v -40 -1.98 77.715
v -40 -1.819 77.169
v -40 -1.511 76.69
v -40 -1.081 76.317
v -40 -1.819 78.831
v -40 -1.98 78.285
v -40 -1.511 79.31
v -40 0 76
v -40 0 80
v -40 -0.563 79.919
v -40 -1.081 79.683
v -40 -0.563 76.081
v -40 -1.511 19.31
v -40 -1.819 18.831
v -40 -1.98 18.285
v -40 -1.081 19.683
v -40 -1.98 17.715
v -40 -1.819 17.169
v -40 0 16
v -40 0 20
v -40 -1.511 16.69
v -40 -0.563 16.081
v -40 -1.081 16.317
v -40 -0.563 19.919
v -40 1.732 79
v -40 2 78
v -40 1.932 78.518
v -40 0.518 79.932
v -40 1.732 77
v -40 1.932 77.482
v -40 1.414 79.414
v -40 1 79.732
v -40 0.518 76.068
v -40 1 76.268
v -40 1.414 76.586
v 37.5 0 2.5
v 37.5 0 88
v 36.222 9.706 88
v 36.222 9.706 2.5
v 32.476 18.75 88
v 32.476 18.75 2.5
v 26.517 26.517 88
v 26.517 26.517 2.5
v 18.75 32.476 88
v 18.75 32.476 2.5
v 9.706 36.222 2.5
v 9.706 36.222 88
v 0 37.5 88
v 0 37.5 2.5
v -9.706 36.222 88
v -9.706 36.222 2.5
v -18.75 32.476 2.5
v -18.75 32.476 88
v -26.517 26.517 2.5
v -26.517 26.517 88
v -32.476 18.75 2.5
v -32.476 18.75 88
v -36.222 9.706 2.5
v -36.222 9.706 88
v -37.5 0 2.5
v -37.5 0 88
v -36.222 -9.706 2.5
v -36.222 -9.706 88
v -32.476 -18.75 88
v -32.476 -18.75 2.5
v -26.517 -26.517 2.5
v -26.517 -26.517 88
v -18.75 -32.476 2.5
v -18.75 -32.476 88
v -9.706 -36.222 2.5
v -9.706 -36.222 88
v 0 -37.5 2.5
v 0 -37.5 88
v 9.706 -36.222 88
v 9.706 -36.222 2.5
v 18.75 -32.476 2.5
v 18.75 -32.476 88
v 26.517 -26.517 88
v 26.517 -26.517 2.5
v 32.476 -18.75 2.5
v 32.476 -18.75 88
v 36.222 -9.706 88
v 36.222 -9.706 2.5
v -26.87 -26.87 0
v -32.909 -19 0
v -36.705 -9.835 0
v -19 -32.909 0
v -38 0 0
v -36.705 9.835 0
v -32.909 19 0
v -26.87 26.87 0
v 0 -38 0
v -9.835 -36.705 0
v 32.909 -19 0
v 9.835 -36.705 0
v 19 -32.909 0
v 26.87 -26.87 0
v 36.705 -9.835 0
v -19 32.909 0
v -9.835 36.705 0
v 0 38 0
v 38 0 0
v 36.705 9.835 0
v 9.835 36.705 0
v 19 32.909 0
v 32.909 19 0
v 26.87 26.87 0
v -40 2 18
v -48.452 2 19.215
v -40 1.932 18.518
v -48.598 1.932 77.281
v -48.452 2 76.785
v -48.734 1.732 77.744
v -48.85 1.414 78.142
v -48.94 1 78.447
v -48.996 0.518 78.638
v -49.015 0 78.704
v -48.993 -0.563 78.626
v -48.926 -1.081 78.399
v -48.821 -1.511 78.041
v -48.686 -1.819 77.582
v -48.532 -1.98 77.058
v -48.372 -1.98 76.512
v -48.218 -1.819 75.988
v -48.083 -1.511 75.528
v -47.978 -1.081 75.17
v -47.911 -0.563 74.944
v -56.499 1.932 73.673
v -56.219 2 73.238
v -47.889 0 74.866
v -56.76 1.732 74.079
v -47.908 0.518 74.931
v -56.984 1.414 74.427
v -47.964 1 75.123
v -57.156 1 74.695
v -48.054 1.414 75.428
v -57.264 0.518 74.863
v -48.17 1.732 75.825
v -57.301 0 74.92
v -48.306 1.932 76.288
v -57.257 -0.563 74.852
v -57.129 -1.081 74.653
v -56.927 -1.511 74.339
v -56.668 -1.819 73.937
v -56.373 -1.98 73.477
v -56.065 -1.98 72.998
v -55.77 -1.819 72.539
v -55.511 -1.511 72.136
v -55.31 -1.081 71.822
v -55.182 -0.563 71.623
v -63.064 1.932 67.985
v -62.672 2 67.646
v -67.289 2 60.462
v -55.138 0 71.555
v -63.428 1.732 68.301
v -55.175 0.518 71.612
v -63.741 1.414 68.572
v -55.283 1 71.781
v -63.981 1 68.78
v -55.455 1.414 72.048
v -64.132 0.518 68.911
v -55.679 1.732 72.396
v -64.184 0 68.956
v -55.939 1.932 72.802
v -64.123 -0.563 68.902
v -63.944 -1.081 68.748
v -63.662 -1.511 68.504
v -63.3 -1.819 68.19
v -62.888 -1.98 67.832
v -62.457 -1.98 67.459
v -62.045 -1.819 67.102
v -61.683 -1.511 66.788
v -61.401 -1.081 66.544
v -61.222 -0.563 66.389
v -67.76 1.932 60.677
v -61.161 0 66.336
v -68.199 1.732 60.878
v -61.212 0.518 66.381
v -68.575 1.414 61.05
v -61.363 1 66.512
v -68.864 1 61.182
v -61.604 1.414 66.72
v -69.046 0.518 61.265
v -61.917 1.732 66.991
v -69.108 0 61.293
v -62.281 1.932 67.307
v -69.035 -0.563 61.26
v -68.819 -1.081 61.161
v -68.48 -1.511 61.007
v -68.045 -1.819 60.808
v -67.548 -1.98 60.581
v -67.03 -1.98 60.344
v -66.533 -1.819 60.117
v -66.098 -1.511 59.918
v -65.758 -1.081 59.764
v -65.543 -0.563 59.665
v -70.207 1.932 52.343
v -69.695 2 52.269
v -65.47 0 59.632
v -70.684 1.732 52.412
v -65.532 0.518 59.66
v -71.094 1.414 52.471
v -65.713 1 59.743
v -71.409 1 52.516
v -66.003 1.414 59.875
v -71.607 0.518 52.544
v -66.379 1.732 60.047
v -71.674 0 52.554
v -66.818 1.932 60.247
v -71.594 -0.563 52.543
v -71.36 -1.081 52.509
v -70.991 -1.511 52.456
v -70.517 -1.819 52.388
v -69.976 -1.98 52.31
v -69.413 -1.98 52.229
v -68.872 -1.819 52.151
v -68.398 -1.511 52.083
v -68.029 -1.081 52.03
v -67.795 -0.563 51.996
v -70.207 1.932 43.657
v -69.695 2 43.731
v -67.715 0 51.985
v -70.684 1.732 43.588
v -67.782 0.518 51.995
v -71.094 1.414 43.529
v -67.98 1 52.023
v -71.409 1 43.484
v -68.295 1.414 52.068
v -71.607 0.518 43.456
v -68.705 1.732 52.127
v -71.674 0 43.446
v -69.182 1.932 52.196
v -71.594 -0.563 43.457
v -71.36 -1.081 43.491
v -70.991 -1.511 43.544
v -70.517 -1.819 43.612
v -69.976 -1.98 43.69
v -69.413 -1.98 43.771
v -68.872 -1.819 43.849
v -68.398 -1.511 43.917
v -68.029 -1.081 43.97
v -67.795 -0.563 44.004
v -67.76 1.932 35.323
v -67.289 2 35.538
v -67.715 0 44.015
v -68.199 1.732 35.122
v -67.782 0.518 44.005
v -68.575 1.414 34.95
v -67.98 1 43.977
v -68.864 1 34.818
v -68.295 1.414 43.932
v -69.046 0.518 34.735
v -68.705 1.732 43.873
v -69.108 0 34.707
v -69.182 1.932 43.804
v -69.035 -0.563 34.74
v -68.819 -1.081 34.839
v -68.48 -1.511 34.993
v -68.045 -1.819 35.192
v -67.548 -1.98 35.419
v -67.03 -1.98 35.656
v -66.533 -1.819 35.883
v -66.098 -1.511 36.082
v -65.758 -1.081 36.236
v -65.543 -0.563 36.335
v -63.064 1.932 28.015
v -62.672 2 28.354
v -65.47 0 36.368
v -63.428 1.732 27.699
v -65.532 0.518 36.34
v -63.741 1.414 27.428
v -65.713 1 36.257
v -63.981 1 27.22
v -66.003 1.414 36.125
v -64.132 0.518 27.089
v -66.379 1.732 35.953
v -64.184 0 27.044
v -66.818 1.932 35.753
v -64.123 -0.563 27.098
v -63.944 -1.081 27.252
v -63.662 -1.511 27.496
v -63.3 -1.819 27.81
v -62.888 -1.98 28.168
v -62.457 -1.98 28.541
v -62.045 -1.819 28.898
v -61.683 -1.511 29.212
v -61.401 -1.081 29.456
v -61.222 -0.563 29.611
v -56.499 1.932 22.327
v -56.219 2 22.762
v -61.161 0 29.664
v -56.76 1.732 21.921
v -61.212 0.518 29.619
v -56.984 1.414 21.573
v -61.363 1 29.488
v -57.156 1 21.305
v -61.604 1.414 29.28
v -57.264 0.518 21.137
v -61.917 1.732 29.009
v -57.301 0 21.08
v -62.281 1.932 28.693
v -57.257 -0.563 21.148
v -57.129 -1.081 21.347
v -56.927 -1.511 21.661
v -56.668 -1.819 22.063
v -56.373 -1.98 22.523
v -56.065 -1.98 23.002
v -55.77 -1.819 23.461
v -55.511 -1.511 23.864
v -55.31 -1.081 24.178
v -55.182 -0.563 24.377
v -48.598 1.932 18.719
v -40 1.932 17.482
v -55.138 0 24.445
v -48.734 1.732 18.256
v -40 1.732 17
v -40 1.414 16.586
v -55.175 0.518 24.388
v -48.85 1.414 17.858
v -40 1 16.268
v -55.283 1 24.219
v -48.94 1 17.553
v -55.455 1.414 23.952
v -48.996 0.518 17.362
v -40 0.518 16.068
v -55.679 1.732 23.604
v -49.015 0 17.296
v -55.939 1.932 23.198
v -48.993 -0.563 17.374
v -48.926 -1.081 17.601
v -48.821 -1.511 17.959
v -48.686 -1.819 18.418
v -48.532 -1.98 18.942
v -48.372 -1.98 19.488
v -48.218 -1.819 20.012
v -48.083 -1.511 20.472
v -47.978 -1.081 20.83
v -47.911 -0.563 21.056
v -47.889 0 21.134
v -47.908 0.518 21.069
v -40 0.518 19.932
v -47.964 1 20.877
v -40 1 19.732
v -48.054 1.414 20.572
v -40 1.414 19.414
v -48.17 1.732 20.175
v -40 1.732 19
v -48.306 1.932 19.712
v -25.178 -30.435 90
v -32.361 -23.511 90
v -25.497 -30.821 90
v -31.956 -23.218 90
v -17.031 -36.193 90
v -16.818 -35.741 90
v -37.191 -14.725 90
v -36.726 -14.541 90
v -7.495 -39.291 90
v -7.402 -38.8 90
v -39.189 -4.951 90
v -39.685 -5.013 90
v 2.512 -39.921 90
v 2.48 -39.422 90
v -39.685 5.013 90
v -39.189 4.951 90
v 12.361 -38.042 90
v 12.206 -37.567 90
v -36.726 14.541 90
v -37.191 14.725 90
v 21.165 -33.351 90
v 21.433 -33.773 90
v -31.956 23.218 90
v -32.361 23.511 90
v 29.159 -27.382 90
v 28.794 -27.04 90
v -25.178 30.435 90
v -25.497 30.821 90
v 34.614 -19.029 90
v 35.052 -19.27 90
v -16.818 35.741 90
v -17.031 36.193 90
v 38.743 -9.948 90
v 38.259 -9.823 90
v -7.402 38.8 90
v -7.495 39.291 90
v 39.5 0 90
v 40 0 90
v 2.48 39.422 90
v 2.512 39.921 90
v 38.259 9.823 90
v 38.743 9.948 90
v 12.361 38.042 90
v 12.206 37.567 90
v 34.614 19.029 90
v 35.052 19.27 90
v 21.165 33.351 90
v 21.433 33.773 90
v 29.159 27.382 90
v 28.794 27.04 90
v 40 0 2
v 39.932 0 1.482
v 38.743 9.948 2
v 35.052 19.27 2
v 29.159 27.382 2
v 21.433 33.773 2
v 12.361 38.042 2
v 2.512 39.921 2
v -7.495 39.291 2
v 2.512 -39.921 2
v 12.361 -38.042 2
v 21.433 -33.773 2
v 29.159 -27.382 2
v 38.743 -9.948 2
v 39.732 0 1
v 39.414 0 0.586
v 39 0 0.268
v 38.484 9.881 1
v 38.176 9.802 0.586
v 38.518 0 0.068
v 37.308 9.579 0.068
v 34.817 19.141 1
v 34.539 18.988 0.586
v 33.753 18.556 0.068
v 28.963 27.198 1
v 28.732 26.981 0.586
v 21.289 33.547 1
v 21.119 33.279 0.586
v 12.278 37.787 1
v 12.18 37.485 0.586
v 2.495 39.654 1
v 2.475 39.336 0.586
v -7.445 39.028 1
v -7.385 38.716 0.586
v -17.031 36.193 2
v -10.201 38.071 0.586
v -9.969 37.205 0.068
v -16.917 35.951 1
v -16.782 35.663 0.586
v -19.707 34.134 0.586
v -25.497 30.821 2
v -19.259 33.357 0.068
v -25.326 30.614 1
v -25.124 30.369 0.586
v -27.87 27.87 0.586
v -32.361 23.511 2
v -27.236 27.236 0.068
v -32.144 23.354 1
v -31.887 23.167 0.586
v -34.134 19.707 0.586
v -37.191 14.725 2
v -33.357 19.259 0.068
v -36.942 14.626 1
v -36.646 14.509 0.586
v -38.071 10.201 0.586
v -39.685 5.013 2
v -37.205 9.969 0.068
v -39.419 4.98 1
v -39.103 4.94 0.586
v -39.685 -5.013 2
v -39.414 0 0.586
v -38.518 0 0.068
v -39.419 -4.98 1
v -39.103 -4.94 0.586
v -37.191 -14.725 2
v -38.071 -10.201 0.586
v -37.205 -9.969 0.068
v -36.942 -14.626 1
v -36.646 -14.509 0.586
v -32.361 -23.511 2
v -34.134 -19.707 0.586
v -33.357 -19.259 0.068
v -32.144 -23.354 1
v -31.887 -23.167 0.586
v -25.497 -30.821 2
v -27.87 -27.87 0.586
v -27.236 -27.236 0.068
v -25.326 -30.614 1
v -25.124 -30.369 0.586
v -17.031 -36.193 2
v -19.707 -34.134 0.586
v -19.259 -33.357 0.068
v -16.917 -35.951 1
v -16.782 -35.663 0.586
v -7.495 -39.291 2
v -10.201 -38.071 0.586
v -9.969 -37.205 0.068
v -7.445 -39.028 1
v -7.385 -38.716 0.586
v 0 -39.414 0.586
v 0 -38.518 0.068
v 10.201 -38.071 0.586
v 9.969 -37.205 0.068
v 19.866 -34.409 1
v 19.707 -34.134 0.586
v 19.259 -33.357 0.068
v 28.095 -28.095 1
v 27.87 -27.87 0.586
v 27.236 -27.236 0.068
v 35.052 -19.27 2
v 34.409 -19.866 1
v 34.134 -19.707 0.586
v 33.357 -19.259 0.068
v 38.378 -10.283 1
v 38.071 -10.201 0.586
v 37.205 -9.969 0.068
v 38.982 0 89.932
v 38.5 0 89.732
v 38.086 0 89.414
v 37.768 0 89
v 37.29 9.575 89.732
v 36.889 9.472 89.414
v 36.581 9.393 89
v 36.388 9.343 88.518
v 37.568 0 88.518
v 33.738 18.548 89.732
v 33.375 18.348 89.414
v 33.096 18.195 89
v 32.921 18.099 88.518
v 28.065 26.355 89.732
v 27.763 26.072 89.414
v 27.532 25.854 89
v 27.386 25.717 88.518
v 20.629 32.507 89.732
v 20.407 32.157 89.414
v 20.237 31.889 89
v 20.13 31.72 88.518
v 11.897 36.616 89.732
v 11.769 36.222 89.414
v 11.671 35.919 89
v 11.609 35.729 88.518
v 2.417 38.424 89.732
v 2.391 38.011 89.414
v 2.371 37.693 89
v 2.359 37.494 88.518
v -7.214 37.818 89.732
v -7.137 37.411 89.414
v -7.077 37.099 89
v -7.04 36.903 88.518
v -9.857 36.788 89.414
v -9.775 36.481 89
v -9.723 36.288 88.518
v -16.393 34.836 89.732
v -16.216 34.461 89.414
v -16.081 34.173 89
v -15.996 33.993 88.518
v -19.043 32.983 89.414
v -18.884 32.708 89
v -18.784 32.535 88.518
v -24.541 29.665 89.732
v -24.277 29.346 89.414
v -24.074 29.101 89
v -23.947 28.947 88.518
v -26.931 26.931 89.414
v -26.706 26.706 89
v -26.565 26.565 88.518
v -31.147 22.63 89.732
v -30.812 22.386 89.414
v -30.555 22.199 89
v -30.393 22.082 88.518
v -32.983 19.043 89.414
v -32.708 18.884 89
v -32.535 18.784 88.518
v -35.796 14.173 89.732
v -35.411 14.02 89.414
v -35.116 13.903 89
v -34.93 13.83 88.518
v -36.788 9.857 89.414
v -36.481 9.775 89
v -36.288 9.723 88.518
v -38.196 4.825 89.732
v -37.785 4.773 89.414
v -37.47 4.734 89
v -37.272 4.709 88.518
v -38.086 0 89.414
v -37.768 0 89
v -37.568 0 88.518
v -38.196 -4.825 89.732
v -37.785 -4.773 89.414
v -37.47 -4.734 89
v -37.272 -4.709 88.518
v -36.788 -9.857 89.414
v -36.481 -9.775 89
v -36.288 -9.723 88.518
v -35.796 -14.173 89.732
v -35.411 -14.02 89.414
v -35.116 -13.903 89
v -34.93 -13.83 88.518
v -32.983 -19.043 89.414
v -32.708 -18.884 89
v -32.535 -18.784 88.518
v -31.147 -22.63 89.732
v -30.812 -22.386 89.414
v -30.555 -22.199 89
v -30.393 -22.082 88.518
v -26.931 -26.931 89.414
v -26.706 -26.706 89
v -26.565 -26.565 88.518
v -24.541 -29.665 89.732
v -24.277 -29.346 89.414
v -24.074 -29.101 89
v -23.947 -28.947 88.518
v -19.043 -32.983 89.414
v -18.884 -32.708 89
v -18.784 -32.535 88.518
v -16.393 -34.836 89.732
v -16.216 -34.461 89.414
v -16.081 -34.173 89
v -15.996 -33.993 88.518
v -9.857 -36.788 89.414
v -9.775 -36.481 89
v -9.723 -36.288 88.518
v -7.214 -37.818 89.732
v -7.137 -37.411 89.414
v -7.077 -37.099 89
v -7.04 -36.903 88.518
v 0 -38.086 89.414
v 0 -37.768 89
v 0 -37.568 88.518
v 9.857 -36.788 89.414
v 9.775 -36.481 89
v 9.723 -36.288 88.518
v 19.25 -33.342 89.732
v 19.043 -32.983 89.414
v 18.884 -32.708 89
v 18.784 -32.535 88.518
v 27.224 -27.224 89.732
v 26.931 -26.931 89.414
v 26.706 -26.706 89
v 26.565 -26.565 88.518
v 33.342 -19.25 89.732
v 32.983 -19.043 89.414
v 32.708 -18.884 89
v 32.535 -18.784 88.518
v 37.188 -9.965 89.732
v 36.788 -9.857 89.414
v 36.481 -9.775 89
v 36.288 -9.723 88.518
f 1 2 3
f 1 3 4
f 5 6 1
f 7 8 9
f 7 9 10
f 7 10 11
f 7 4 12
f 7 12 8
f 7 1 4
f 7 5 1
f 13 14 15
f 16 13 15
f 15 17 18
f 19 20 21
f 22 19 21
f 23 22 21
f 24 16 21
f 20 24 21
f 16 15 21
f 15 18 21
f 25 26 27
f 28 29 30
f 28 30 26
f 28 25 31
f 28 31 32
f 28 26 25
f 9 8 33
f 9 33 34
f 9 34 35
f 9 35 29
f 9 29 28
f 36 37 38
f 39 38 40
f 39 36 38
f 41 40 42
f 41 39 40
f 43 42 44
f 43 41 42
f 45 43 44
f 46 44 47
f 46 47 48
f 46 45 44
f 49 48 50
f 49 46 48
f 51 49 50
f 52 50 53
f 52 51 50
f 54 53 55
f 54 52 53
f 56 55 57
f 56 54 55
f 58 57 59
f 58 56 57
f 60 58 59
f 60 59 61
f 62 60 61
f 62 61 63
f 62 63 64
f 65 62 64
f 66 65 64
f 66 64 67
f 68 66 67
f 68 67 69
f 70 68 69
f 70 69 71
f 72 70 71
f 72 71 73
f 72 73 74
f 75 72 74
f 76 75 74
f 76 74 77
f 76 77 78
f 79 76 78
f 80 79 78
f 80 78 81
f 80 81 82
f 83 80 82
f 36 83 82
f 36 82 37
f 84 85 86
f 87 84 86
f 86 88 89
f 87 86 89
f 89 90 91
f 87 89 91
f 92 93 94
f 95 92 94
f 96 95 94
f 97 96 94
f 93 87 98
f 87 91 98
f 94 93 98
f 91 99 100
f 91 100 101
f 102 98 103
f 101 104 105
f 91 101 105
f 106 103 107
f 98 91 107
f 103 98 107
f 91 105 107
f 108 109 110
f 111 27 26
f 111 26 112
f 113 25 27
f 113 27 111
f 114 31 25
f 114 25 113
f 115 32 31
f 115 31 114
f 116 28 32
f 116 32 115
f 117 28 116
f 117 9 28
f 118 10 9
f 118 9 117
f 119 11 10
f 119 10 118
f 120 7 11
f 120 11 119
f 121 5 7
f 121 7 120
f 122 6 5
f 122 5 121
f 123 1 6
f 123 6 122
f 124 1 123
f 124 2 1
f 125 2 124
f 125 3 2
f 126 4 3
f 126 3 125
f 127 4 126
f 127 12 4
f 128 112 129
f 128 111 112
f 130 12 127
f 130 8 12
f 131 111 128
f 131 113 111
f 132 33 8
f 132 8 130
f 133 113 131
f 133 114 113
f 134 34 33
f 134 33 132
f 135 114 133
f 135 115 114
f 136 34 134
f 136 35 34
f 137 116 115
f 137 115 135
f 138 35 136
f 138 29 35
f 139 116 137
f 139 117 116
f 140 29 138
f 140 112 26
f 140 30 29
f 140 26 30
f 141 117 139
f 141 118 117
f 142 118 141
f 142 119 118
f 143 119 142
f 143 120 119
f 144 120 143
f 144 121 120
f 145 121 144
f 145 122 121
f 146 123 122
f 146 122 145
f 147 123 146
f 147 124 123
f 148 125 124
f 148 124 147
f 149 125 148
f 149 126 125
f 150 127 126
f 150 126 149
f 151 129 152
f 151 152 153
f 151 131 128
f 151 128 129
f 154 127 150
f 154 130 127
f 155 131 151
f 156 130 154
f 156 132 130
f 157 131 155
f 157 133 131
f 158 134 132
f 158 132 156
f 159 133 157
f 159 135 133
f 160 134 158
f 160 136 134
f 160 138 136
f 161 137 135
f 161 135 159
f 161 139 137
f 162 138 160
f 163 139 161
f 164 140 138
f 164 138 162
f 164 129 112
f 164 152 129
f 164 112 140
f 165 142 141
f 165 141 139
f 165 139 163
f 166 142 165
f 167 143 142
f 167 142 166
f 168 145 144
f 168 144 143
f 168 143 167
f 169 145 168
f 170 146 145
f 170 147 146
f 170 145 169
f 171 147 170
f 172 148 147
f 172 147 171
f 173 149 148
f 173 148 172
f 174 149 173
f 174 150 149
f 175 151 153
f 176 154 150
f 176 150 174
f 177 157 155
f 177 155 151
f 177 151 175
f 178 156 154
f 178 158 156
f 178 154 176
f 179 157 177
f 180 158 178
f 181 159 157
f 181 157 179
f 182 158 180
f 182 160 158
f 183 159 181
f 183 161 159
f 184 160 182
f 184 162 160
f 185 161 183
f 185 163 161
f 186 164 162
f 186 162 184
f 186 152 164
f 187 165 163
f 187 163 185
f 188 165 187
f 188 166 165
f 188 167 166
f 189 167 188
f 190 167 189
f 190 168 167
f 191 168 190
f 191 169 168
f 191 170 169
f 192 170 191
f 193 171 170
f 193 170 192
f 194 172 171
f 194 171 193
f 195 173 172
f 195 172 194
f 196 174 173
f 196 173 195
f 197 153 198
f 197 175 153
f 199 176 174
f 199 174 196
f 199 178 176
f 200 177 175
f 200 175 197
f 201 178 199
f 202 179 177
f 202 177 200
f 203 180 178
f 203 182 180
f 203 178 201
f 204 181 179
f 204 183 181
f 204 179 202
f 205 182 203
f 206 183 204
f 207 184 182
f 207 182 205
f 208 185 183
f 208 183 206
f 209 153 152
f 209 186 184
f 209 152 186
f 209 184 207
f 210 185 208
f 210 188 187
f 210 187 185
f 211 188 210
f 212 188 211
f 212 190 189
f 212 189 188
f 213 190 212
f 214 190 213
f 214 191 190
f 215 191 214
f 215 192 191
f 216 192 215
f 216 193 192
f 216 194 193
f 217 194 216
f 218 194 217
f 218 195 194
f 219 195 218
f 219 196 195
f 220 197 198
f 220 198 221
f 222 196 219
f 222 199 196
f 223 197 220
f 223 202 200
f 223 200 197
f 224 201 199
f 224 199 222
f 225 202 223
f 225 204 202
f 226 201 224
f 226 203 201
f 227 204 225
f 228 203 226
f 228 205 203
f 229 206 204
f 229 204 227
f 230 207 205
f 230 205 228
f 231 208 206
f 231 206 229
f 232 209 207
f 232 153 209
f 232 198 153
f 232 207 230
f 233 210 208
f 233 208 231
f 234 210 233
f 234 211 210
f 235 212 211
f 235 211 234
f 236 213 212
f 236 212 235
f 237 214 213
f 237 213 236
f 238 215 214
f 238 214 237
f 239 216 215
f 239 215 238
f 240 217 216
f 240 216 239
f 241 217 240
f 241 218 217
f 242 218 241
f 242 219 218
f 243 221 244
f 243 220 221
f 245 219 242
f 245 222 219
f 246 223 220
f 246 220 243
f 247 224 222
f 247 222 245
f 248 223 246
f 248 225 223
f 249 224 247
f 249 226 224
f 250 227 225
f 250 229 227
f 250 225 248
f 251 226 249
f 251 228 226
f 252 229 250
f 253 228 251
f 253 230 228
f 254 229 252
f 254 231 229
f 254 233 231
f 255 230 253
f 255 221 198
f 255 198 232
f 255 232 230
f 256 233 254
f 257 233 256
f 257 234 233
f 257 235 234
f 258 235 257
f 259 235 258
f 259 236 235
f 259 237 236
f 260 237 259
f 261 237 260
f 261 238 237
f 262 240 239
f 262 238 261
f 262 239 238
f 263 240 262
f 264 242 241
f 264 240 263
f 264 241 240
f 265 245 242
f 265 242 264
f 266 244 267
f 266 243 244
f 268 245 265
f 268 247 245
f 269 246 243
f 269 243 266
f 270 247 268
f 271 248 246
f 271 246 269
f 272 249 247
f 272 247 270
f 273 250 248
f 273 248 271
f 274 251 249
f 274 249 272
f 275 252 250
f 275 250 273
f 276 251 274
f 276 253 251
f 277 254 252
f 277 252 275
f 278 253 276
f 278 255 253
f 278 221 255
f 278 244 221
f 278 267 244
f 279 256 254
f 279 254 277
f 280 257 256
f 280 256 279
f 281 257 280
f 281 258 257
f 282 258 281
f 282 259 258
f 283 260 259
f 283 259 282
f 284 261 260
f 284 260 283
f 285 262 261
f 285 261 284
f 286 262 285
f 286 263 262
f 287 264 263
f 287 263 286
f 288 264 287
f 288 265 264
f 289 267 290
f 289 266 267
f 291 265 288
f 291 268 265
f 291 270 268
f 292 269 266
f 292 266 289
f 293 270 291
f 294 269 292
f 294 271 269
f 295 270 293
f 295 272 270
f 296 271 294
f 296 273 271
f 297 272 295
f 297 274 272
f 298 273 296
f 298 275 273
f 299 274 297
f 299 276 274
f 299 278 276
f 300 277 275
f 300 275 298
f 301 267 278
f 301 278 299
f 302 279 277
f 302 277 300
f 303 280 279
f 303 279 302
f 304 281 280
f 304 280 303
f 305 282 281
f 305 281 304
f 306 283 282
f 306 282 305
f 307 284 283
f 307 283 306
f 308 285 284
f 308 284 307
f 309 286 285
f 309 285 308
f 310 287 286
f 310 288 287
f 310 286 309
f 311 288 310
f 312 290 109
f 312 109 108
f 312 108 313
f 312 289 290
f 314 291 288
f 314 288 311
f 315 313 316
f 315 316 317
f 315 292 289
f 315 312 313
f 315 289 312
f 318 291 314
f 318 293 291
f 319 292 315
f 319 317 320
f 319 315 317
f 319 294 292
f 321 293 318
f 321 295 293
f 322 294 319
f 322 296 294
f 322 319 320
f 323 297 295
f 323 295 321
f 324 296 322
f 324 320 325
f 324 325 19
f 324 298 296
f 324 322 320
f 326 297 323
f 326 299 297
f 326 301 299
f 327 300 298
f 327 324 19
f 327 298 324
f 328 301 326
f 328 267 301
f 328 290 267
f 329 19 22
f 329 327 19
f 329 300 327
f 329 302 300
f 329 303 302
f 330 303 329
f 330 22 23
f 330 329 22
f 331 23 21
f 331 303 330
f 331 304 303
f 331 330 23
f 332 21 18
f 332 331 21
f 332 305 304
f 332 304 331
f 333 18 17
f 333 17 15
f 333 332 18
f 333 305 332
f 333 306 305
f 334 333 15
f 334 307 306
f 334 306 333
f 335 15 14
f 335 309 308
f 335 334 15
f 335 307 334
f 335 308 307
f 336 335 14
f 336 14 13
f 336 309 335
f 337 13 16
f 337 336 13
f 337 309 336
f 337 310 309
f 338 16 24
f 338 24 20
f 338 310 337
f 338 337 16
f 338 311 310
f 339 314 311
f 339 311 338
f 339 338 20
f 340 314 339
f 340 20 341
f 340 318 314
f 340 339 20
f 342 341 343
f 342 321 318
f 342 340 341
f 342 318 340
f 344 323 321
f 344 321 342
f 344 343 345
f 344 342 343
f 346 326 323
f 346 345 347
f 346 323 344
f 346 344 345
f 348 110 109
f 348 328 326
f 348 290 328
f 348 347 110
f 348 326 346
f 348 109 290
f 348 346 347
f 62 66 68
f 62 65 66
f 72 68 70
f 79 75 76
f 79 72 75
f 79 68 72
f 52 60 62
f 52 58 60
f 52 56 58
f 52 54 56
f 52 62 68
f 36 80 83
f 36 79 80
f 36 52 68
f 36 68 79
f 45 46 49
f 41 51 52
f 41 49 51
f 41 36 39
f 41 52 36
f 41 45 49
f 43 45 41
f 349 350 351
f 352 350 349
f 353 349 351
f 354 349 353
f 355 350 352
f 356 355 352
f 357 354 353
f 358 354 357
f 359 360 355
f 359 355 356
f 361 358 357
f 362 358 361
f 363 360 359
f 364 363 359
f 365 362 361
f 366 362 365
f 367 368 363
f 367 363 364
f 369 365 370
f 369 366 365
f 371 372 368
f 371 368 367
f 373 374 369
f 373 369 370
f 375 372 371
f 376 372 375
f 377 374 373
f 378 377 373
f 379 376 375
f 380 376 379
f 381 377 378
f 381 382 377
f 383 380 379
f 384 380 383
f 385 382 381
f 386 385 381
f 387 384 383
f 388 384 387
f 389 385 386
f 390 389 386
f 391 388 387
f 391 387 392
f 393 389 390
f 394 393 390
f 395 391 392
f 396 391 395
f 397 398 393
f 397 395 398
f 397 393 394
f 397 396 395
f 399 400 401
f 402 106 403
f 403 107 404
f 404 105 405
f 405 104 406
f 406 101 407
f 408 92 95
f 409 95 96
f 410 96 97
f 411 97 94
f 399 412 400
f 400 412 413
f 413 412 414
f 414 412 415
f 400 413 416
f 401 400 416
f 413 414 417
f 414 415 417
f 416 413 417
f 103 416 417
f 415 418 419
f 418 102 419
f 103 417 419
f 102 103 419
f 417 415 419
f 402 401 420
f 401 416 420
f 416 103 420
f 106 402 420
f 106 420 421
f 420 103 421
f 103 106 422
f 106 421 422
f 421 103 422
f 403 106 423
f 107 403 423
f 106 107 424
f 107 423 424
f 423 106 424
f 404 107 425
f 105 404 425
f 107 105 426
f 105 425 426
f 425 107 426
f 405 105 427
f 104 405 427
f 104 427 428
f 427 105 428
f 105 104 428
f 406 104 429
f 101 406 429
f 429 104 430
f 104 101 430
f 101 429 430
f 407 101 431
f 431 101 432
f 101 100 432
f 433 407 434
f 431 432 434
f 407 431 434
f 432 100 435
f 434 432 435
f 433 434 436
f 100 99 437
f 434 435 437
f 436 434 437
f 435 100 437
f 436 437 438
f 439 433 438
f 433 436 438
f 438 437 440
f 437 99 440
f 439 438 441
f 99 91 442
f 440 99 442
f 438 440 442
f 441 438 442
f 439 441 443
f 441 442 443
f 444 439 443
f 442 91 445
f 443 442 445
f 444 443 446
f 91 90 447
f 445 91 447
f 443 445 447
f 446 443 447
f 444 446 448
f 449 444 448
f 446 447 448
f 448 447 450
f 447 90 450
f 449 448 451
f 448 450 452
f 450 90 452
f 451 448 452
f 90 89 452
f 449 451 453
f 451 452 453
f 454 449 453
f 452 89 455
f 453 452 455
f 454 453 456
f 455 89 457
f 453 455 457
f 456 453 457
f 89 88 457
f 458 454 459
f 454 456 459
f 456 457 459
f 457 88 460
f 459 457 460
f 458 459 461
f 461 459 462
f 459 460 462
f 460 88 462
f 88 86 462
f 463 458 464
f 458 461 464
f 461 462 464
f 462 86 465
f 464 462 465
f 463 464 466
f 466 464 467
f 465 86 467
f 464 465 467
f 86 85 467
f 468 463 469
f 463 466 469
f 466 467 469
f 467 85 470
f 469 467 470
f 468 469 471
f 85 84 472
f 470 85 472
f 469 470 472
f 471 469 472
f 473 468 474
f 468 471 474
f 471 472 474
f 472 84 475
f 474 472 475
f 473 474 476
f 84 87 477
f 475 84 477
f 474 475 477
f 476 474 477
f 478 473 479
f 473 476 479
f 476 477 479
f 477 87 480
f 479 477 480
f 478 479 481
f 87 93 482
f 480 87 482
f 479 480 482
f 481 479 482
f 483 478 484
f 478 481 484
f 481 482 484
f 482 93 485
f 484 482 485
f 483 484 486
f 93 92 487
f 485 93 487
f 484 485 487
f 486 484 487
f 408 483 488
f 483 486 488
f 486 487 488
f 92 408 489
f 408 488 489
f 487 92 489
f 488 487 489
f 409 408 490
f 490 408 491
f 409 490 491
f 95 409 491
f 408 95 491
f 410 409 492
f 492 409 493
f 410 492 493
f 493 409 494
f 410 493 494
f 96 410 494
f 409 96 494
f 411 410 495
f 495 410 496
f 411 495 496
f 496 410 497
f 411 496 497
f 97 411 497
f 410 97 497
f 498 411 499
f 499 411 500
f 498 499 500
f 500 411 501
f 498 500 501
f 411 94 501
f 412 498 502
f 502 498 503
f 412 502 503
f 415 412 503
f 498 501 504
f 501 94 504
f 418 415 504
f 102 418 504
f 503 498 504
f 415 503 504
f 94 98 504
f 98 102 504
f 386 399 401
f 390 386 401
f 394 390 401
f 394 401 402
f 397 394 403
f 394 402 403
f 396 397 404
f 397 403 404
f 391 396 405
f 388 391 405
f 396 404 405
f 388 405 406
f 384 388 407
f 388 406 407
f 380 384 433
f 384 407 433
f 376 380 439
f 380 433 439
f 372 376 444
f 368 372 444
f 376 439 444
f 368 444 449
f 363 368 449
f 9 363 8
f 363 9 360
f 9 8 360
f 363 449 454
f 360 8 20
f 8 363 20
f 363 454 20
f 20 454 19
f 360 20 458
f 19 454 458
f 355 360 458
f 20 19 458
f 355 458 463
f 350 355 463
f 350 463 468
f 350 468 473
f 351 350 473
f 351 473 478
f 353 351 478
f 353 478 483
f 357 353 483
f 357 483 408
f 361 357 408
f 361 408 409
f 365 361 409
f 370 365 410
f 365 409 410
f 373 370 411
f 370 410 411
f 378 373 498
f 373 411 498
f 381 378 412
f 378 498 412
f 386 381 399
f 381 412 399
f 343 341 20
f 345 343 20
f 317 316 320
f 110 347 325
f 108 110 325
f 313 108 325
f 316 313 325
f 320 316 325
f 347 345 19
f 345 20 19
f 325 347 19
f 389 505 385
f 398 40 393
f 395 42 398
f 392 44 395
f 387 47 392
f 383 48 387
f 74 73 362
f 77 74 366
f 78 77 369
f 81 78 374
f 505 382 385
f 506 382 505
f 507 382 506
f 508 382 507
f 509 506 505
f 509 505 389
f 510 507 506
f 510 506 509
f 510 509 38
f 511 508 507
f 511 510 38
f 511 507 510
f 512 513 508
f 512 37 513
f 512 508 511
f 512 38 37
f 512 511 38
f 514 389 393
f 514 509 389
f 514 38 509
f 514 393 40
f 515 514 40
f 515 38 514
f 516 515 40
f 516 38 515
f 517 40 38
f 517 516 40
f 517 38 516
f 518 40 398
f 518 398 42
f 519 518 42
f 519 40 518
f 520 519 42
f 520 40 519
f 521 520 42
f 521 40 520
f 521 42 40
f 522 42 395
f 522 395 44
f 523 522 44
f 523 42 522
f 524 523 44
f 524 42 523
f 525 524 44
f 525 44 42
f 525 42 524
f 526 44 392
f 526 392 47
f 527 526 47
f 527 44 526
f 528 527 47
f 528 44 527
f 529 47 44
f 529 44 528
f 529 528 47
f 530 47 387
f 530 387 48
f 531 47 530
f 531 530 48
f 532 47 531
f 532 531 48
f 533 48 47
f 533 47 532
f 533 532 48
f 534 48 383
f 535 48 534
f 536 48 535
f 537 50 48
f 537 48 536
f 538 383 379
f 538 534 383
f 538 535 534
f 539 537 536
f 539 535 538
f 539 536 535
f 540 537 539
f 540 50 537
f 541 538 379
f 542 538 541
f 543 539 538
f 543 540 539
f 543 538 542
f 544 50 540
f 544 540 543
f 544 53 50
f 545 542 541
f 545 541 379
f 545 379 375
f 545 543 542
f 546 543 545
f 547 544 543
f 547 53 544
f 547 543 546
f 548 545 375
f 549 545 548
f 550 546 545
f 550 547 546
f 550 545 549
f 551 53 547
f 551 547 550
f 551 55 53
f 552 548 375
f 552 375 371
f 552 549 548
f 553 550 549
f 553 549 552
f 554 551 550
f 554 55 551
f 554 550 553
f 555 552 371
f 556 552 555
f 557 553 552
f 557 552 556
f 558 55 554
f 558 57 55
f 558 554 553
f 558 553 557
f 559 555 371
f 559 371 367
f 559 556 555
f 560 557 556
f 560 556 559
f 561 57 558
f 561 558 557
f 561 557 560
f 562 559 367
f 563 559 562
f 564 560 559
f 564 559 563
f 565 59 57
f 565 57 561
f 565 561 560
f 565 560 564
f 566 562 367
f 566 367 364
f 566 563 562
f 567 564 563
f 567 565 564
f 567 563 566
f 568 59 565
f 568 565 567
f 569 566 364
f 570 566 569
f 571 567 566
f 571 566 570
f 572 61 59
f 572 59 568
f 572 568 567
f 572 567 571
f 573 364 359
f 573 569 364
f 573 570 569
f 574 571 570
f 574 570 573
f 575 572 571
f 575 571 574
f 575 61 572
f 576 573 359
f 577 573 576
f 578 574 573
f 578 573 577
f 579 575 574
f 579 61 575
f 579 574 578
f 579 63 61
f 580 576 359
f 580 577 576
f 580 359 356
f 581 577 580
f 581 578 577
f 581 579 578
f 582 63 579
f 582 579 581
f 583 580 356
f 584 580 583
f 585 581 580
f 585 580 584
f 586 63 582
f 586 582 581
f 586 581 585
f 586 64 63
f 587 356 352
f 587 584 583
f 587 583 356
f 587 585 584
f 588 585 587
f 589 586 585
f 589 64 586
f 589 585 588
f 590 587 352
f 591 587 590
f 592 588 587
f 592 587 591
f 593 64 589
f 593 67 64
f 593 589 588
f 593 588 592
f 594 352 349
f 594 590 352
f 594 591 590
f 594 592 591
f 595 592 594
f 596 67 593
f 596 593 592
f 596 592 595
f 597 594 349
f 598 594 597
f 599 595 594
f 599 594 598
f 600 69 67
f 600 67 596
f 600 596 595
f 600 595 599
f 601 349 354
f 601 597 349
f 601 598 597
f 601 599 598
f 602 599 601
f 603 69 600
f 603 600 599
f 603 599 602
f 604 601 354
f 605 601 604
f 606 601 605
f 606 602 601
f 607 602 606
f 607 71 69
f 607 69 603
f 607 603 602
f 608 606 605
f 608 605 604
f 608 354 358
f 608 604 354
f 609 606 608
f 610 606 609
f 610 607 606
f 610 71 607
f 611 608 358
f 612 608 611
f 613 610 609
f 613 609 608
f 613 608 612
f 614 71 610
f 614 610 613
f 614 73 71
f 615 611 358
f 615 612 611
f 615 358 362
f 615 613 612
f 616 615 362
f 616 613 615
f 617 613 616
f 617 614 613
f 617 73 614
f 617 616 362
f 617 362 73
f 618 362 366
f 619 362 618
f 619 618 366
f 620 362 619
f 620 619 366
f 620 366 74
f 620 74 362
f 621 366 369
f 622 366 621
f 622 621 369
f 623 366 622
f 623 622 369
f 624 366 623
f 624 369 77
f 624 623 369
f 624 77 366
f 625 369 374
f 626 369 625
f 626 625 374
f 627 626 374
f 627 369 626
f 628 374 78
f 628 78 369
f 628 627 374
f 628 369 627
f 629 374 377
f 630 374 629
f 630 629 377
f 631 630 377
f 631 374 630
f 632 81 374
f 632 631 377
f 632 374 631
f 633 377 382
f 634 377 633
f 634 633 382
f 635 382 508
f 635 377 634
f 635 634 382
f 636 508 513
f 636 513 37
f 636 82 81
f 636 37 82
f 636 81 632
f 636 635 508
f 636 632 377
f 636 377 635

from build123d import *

# Parameters (mm, degrees)
F0_R     = 40
F1_DEPTH = 90
F2_T     = -2.5
F3_R     = 2
F6_R     = 2
F8_R     = 2


with BuildPart() as f1:
    # F0 (on Top) → F1 (new body)
    with BuildSketch(Plane.XY):
        Circle(F0_R)
    extrude(amount=F1_DEPTH)

    # F2
    f2_openings = [f1.faces().sort_by_distance(p)[0] for p in [
        (0, 0, 90),
    ]]
    offset(amount=F2_T, openings=f2_openings)

    # F3
    f3_edges = [f1.edges().sort_by_distance(p)[0] for p in [
        (-37.5, 0, 90),
    ]]
    fillet(f3_edges, radius=F3_R)

    # F7: sweep along a path in F4
    with BuildLine(Plane.XZ) as f7_path:
        ThreePointArc((-40, 78), (-70, 48), (-40, 18))
    # F6 (on offset) → F7 (sweep)
    with BuildSketch(Plane.YZ.offset(-40)):
        with Locations((0, 78)):
            Circle(F6_R)
    sweep(path=f7_path.line)

    # F8
    f8_edges = [f1.edges().sort_by_distance(p)[0] for p in [
        (-40, 0, 0),
    ]]
    fillet(f8_edges, radius=F8_R)


solid = f1.part
